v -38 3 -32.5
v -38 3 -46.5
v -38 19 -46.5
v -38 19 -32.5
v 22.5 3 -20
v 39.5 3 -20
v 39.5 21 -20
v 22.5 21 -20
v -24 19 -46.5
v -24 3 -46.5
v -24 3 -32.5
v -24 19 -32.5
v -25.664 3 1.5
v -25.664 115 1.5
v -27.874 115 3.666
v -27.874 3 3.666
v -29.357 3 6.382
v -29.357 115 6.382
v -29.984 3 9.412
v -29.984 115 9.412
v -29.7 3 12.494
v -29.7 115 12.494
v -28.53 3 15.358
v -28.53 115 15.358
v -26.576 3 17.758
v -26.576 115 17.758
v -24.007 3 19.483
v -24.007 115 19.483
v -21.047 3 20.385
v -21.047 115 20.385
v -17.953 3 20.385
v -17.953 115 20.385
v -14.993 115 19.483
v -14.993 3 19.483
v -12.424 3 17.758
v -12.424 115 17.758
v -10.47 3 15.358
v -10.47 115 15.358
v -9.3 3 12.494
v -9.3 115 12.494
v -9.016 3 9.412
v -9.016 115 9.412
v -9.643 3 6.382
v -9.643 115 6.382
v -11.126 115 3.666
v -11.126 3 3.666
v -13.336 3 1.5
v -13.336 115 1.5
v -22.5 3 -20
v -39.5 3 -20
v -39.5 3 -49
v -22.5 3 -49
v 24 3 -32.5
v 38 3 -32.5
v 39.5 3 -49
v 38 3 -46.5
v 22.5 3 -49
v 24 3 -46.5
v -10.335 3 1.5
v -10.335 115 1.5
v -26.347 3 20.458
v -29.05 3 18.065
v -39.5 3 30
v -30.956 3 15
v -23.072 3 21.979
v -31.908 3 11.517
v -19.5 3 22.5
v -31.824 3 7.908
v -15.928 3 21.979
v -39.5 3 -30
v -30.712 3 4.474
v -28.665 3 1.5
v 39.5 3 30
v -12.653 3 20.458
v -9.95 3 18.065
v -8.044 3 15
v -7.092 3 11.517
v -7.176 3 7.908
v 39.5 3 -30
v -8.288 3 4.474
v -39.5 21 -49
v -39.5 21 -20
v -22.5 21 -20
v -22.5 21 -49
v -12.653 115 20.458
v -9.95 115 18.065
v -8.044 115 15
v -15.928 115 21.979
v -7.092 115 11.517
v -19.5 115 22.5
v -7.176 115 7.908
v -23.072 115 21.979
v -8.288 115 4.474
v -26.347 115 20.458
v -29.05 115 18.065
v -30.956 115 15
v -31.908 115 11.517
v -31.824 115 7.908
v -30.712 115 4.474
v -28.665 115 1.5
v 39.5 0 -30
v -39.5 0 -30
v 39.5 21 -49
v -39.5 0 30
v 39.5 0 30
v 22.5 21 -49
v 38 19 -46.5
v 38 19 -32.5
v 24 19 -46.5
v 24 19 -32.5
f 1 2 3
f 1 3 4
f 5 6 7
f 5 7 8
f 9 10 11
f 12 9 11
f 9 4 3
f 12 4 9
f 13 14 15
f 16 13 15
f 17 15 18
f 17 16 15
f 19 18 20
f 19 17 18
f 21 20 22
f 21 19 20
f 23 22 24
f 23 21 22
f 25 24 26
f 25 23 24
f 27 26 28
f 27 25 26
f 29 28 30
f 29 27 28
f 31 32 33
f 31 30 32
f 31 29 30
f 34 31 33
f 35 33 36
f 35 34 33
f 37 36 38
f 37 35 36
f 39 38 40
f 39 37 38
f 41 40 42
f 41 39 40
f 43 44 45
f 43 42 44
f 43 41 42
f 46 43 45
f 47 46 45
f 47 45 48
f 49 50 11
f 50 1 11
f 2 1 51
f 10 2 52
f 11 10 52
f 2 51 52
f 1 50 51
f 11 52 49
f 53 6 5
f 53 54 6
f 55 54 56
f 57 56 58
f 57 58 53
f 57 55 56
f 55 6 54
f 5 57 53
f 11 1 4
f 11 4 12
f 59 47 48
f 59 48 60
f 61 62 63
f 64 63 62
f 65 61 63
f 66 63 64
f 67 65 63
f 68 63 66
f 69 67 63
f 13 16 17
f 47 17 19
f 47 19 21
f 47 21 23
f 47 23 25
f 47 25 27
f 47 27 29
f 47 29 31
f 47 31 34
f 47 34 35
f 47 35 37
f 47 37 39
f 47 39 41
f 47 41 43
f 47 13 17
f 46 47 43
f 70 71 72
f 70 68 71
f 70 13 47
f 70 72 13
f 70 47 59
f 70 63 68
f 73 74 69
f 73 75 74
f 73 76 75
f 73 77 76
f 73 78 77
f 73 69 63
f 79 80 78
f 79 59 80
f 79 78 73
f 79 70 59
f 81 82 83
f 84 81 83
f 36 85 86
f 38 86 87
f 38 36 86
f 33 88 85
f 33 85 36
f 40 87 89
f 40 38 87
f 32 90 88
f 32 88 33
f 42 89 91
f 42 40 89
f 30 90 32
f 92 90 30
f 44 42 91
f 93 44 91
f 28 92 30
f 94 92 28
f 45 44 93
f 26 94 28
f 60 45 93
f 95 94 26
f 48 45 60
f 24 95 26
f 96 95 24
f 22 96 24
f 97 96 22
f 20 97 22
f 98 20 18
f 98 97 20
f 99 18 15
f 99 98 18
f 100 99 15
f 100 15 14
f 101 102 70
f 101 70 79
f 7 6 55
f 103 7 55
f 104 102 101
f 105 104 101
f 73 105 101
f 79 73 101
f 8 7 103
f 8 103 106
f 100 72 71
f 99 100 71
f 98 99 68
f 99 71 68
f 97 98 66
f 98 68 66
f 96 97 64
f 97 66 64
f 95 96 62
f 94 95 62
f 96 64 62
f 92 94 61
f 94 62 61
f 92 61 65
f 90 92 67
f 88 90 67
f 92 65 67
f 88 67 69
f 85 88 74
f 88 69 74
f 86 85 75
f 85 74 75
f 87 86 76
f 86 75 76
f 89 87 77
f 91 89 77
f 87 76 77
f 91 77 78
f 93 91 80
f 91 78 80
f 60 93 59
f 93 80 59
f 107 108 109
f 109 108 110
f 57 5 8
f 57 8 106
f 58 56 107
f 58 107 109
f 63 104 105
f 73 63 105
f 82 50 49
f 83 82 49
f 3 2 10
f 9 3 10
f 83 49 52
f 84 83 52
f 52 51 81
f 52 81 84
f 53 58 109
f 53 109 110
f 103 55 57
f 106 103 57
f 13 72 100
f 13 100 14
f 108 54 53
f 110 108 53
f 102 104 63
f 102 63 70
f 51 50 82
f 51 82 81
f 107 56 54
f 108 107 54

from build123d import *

# Parameters (mm, degrees)
SKETCH1_W           = 79
SKETCH1_H           = 60
BOSS_EXTRUDE1_DEPTH = 3
SKETCH2_W           = 17
SKETCH2_H           = 29
BOSS_EXTRUDE2_DEPTH = 18
SKETCH3_W           = 14
SKETCH3_H           = 14
CUT_EXTRUDE1_DEPTH  = 16
SKETCH5_R           = 12.5
BOSS_EXTRUDE3_DEPTH = 112
SKETCH7_W           = 40
SKETCH7_H           = 11.5
CUT_EXTRUDE2_DEPTH  = 112
SKETCH8_R           = 10.5
CUT_EXTRUDE3_DEPTH  = 112


with BuildPart() as part:
    # Sketch1 → Boss-Extrude1 (new body)
    with BuildSketch(Plane(origin=(0, 0, 0), x_dir=(1, 0, 0), z_dir=(0, 1, 0))):
        Rectangle(SKETCH1_W, SKETCH1_H)
    extrude(amount=BOSS_EXTRUDE1_DEPTH)

    # Sketch5 → Boss-Extrude3 (add)
    with BuildSketch(Plane(origin=(0, 3, 0), x_dir=(1, 0, 0), z_dir=(0, 1, 0))):
        with Locations(Location((-19.5, -10, 0), (0, 0, 90))):
            Circle(SKETCH5_R)
    extrude(amount=BOSS_EXTRUDE3_DEPTH)

    # Sketch7 → Cut-Extrude2 (cut)
    with BuildSketch(Plane(origin=(0, 3, 0), x_dir=(1, 0, 0), z_dir=(0, 1, 0))):
        with Locations((-19.5, 4.25)):
            Rectangle(SKETCH7_W, SKETCH7_H)
    extrude(amount=CUT_EXTRUDE2_DEPTH, mode=Mode.SUBTRACT)

    # Sketch8 → Cut-Extrude3 (cut)
    with BuildSketch(Plane(origin=(0, 3, 0), x_dir=(1, 0, 0), z_dir=(0, 1, 0))):
        with Locations((-19.5, -10)):
            Circle(SKETCH8_R)
    extrude(amount=CUT_EXTRUDE3_DEPTH, mode=Mode.SUBTRACT)


with BuildPart() as body_2:
    # Sketch2 → Boss-Extrude2 (new body)
    with BuildSketch(Plane(origin=(0, 3, 0), x_dir=(1, 0, 0), z_dir=(0, 1, 0))):
        with Locations((-31, 34.5)):
            Rectangle(SKETCH2_W, SKETCH2_H)
    extrude(amount=BOSS_EXTRUDE2_DEPTH)

    # Sketch3 → Cut-Extrude1 (cut)
    with BuildSketch(Plane.XZ.offset(-3)):
        with Locations((-31, -39.5)):
            Rectangle(SKETCH3_W, SKETCH3_H)
    extrude(amount=-CUT_EXTRUDE1_DEPTH, mode=Mode.SUBTRACT)


with BuildPart() as body_3:
    # Mirror1: mirrored copy
    add(body_2.part.mirror(Plane(origin=(0, 0, 0), x_dir=(0, 0, 1), z_dir=(1, 0, 0))))


solid = Compound([part.part, body_2.part, body_3.part])
